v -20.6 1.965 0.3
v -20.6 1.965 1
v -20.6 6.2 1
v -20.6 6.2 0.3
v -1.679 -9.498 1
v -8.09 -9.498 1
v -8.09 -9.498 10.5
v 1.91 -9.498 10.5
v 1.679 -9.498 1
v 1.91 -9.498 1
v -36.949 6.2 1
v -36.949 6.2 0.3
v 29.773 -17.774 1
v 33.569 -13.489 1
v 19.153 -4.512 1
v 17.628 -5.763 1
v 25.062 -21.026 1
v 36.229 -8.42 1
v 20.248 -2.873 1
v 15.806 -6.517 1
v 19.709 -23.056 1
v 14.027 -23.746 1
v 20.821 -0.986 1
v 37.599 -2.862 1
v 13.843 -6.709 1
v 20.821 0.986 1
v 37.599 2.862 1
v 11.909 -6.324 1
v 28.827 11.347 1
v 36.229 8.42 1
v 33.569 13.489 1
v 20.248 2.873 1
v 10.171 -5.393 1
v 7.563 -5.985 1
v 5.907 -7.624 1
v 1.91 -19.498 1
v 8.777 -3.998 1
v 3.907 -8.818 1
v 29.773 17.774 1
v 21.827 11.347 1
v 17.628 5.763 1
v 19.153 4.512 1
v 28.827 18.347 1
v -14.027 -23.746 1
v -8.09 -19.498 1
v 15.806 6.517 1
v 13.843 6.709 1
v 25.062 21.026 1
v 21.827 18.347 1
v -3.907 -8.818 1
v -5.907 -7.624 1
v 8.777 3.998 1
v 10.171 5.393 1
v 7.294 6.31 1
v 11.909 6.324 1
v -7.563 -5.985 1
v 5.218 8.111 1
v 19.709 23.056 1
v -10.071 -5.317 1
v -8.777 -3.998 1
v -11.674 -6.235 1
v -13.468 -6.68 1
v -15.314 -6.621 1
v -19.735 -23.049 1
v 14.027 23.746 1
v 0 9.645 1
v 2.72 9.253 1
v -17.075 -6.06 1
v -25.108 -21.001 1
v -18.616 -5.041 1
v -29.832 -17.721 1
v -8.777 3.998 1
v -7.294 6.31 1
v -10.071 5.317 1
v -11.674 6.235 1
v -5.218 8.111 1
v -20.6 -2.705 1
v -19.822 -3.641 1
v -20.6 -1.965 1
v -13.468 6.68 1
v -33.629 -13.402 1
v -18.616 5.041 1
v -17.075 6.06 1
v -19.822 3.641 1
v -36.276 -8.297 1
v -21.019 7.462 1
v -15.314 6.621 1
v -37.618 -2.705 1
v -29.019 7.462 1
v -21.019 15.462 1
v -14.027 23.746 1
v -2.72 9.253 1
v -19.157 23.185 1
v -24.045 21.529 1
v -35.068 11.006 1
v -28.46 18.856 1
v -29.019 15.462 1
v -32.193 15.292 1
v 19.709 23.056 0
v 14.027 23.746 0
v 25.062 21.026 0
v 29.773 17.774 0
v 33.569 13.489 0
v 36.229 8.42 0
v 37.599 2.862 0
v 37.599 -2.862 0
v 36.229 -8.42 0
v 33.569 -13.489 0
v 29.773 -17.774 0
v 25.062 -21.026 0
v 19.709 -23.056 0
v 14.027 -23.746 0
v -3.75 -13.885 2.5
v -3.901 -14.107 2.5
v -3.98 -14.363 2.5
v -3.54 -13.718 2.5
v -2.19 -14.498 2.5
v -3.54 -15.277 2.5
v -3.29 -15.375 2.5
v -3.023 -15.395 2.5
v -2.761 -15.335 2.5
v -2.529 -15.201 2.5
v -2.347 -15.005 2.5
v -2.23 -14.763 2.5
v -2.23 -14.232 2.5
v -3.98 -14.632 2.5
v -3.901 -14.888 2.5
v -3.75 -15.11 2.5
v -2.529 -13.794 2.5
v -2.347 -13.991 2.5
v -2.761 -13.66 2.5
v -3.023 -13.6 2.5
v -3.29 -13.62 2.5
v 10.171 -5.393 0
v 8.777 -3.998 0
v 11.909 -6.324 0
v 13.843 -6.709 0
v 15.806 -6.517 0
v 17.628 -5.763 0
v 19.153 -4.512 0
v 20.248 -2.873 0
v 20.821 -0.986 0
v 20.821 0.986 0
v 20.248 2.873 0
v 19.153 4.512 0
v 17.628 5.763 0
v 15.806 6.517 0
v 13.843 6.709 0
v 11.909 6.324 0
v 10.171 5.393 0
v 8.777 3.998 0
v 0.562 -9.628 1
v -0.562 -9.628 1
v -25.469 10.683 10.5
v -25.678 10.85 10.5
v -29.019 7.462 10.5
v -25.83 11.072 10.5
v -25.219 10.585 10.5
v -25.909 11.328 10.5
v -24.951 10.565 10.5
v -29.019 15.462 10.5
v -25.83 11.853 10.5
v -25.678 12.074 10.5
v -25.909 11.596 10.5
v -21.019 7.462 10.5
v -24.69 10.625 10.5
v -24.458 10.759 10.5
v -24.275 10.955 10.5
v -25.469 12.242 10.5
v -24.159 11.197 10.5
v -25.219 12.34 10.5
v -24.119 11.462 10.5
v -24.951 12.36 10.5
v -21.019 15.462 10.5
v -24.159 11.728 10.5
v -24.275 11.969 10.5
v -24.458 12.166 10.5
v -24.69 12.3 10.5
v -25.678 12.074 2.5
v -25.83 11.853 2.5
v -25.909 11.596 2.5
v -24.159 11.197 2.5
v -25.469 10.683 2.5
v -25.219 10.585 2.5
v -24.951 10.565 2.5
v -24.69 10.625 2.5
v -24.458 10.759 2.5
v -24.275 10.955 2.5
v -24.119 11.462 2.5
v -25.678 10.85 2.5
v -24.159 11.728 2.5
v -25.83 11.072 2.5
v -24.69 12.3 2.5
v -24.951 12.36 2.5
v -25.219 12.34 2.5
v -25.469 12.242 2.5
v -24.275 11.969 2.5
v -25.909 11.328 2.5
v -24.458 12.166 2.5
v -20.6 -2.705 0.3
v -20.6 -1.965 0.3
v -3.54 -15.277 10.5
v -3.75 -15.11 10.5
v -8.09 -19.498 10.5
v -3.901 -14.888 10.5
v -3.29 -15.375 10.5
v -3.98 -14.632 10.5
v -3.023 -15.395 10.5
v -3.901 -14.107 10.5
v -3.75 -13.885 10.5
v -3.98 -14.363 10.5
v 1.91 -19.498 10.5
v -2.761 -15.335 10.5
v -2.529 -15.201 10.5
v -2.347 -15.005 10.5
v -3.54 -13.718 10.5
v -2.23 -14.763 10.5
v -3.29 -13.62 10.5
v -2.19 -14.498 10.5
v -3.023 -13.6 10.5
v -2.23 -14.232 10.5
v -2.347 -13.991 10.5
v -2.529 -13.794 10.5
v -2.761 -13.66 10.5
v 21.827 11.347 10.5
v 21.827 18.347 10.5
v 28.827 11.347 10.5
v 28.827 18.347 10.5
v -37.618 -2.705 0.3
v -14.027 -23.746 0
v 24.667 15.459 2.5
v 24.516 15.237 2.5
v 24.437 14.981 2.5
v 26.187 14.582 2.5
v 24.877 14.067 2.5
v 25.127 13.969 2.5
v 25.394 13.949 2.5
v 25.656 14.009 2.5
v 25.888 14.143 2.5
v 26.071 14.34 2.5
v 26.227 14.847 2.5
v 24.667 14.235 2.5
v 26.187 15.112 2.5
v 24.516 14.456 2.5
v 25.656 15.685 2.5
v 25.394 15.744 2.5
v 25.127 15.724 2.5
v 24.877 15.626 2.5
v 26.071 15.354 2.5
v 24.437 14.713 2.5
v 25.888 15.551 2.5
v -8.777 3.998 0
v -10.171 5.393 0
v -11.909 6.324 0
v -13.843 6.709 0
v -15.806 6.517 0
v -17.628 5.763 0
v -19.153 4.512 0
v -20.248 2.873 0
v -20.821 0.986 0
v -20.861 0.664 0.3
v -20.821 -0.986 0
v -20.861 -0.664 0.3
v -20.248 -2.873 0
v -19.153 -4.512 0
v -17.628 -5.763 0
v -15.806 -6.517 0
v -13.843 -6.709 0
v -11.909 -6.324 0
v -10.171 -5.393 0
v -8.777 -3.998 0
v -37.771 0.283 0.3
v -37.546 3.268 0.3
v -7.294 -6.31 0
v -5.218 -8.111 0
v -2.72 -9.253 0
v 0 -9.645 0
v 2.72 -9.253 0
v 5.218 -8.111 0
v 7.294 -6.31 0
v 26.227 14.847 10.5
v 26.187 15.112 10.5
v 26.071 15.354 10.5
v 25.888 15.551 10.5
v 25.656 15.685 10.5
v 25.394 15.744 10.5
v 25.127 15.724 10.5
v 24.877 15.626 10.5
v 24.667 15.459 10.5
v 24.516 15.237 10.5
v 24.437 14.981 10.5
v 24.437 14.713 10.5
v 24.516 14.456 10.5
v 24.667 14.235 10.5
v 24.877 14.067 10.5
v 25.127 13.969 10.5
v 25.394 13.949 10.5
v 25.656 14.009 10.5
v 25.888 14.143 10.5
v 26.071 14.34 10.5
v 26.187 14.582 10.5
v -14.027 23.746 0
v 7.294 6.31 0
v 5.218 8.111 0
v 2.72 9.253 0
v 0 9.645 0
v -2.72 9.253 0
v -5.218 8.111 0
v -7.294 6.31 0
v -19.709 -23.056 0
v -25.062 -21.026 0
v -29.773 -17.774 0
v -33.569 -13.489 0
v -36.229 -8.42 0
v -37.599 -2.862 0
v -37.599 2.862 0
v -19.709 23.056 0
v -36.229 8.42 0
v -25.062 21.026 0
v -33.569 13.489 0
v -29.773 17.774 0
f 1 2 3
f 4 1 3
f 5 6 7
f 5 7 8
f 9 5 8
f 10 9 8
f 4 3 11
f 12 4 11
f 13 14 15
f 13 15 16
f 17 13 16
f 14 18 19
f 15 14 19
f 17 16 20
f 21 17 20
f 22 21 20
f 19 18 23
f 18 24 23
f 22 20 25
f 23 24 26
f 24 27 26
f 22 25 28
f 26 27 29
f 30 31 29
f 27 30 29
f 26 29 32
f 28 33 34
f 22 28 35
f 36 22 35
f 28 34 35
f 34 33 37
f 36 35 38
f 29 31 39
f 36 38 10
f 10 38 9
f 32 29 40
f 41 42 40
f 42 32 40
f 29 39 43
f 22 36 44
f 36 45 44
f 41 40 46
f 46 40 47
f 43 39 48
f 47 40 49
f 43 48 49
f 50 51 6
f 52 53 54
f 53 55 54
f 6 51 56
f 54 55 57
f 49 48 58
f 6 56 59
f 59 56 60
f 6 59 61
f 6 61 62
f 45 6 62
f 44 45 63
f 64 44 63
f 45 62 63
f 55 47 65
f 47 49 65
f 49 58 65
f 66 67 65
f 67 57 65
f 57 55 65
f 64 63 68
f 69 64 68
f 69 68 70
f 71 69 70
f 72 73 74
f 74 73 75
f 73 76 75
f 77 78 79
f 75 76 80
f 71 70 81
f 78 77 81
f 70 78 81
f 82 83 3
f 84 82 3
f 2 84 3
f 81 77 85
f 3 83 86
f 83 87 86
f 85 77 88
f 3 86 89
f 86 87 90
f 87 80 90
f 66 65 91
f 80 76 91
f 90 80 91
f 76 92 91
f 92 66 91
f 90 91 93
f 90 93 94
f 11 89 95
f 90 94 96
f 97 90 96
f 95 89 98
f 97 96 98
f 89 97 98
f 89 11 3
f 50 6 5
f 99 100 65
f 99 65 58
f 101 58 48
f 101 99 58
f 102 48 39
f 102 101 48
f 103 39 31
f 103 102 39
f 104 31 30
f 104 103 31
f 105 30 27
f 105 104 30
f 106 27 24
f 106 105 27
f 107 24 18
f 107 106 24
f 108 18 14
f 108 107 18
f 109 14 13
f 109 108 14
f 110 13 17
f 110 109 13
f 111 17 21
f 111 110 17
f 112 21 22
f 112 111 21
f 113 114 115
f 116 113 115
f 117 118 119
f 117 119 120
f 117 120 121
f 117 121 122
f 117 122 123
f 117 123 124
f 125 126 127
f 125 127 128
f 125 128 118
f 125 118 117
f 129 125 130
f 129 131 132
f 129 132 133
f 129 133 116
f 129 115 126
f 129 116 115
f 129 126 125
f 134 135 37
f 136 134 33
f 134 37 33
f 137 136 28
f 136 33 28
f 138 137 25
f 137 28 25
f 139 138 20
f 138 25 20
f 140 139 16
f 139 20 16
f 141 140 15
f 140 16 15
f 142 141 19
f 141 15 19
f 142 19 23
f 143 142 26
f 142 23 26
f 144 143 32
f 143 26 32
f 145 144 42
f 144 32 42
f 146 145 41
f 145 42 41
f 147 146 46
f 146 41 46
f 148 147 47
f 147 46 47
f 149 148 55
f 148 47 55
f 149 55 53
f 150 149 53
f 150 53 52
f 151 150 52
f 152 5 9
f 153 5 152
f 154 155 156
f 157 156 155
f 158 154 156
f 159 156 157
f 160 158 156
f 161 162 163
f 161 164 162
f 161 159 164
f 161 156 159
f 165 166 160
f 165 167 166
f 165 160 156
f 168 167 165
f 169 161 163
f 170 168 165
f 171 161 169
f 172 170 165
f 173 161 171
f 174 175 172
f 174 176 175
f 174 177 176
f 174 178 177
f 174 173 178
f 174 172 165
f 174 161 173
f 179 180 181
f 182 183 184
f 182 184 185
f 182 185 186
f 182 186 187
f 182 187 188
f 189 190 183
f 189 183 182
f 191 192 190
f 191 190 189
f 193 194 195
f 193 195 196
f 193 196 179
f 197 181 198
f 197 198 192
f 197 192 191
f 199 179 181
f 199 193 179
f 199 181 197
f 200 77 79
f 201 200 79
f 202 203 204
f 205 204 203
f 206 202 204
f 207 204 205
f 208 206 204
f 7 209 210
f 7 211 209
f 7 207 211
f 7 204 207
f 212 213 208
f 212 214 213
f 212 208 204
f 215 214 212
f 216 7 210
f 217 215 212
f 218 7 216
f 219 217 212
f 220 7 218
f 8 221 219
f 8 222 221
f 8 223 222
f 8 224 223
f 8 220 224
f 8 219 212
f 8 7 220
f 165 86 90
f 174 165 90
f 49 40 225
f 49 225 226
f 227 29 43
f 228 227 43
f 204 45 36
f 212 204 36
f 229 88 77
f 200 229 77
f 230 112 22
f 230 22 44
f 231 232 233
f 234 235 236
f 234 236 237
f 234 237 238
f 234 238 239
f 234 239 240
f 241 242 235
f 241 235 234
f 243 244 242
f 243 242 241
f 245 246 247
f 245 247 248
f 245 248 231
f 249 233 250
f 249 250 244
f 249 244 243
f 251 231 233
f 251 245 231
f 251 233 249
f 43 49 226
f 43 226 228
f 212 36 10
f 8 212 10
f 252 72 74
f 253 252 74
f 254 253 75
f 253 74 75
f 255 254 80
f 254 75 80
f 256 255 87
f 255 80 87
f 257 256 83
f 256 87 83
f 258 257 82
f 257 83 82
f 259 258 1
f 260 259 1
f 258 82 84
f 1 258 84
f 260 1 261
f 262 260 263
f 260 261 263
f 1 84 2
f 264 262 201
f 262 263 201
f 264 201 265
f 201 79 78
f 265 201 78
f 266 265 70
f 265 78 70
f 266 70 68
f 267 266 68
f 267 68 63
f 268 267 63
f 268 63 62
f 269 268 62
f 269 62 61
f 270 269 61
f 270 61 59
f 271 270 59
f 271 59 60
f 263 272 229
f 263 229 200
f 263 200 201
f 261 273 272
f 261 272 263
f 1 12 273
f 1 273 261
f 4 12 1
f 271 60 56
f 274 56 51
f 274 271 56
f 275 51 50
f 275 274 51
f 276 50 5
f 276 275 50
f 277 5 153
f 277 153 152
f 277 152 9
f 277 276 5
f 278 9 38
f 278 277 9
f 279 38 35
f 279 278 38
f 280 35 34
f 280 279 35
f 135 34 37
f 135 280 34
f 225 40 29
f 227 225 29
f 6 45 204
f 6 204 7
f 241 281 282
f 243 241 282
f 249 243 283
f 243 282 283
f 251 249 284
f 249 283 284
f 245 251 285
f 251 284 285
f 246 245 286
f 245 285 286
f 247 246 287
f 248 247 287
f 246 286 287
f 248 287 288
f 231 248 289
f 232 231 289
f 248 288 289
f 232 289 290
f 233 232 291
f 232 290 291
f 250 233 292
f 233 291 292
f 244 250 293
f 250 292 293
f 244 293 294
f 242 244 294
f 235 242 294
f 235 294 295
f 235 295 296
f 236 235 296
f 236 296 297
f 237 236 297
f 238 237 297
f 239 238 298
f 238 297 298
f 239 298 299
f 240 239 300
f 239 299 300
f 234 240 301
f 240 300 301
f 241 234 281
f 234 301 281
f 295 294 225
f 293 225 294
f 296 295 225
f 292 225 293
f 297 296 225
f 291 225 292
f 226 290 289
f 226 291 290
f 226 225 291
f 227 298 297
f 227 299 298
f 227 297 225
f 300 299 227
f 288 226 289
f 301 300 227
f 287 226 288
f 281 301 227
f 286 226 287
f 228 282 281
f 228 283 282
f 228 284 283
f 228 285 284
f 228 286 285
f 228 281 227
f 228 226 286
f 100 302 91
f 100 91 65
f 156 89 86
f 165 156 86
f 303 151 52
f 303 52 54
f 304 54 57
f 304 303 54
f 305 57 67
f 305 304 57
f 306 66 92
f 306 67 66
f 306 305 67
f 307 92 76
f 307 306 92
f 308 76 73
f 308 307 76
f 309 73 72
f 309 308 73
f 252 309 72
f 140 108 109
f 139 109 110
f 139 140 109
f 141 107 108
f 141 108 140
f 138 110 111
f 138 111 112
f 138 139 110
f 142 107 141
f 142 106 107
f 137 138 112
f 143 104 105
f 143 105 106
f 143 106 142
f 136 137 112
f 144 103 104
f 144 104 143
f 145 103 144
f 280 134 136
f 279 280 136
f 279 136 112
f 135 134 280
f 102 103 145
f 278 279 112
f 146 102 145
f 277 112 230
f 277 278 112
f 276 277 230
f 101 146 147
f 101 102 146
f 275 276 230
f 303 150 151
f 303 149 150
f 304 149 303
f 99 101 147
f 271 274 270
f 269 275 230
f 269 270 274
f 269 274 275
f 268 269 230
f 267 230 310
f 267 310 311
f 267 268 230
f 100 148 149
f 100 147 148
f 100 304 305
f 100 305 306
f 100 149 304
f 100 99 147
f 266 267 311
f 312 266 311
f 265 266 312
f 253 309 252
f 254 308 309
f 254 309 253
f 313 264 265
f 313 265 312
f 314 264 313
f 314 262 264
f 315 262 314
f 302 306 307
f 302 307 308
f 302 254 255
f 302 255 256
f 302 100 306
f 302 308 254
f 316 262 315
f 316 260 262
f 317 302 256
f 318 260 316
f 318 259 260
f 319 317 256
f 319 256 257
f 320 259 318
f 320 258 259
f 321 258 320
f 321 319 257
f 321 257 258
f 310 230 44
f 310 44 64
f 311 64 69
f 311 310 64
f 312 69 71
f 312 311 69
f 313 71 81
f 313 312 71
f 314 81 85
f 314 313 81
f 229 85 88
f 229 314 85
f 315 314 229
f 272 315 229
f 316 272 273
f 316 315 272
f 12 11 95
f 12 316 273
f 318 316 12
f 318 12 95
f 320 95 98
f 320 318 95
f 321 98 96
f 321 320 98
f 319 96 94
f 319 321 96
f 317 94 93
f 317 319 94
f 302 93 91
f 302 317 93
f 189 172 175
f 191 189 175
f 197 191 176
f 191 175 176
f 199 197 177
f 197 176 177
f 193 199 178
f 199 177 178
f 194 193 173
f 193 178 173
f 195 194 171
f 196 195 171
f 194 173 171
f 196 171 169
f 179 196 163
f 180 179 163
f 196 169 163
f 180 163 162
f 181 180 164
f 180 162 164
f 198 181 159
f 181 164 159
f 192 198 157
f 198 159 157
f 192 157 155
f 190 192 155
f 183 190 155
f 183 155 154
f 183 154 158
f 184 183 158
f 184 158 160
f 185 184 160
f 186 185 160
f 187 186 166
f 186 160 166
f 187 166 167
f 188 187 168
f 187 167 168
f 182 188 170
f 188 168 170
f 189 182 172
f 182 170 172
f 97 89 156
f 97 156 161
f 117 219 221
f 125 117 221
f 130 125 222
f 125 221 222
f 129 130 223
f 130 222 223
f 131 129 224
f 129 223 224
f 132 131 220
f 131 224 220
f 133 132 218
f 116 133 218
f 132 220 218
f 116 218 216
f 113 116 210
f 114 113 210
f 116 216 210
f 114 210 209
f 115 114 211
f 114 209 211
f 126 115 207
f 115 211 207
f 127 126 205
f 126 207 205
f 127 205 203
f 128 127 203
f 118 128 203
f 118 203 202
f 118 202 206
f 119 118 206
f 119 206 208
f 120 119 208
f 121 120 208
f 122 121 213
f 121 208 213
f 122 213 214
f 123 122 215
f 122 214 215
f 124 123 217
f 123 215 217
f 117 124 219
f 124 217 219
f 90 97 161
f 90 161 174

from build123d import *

# Parameters (mm, degrees)
SKETCH1_R               = 9.64479785
BOSS_EXTRUDE1_DEPTH     = 1
SKETCH2_W               = 8
SKETCH2_H               = 8
SKETCH2_W_2             = 10
SKETCH2_H_2             = 10
SKETCH2_W_3             = 7
SKETCH2_H_3             = 7
BOSS_EXTRUDE2_DEPTH     = 9.5
SKETCH3_R               = 0.9
CUT_EXTRUDE1_DEPTH      = 8
CUT_EXTRUDE2_DEPTH      = 0.7
SKETCH6_R               = 6.717749006
CUT_EXTRUDE7_DEPTH      = 10.5
CUT_EXTRUDE7_DEPTH_BACK = 2


with BuildPart() as part:
    # Sketch1 → Boss-Extrude1 (new body)
    with BuildSketch(Plane.XY):
        with BuildLine():
            Line((-14.026724751, 23.745574299), (14.026724751, 23.745574299))
            ThreePointArc((14.026724751, 23.745574299), (37.77229905, 0), (14.026724751, -23.745574299))
            Line((14.026724751, -23.745574299), (-14.026724751, -23.745574299))
            ThreePointArc((-14.026724751, -23.745574299), (-37.77229905, 0), (-14.026724751, 23.745574299))
        make_face()
        Circle(SKETCH1_R, mode=Mode.SUBTRACT)
    extrude(amount=BOSS_EXTRUDE1_DEPTH)

    # Sketch2 → Boss-Extrude2 (add)
    with BuildSketch(Plane.XY.offset(1)):
        with Locations((-25.018703454, 11.462322744)):
            Rectangle(SKETCH2_W, SKETCH2_H)
        with Locations((-3.090198121, -14.497536266)):
            Rectangle(SKETCH2_W_2, SKETCH2_H_2)
        with Locations((25.327090693, 14.846915234)):
            Rectangle(SKETCH2_W_3, SKETCH2_H_3)
    extrude(amount=BOSS_EXTRUDE2_DEPTH)

    # Sketch3 → Cut-Extrude1 (cut)
    with BuildSketch(Plane.XY.offset(10.5)):
        with Locations((-25.018703454, 11.462322744)):
            Circle(SKETCH3_R)
        with Locations((25.327090693, 14.846915234)):
            Circle(SKETCH3_R)
        with Locations((-3.090198121, -14.497536266)):
            Circle(SKETCH3_R)
    extrude(amount=-CUT_EXTRUDE1_DEPTH, mode=Mode.SUBTRACT)

    # Sketch4 → Cut-Extrude2 (cut)
    with BuildSketch(Plane.XY.offset(1)):
        with BuildLine():
            Line((-20.6, 6.2), (-36.948598558, 6.2))
            ThreePointArc((-36.948598558, 6.2), (-37.70555704, 1.779100955), (-37.617693234, -2.705273523))
            Line((-37.617693234, -2.705273523), (-20.6, -2.705273523))
            Line((-20.6, -2.705273523), (-20.6, 6.2))
        make_face()
    extrude(amount=-CUT_EXTRUDE2_DEPTH, mode=Mode.SUBTRACT)

    # Sketch6 → Cut-Extrude7 (cut, two sides)
    with BuildSketch(Plane.XY.offset(1)) as cut_extrude7_sk:
        with Locations((14.176031791, 0)):
            Circle(SKETCH6_R)
        with Locations((-14.176031791, 0)):
            Circle(SKETCH6_R)
    extrude(amount=CUT_EXTRUDE7_DEPTH, mode=Mode.SUBTRACT)
    extrude(cut_extrude7_sk.sketch, amount=-CUT_EXTRUDE7_DEPTH_BACK, mode=Mode.SUBTRACT)


solid = part.part
